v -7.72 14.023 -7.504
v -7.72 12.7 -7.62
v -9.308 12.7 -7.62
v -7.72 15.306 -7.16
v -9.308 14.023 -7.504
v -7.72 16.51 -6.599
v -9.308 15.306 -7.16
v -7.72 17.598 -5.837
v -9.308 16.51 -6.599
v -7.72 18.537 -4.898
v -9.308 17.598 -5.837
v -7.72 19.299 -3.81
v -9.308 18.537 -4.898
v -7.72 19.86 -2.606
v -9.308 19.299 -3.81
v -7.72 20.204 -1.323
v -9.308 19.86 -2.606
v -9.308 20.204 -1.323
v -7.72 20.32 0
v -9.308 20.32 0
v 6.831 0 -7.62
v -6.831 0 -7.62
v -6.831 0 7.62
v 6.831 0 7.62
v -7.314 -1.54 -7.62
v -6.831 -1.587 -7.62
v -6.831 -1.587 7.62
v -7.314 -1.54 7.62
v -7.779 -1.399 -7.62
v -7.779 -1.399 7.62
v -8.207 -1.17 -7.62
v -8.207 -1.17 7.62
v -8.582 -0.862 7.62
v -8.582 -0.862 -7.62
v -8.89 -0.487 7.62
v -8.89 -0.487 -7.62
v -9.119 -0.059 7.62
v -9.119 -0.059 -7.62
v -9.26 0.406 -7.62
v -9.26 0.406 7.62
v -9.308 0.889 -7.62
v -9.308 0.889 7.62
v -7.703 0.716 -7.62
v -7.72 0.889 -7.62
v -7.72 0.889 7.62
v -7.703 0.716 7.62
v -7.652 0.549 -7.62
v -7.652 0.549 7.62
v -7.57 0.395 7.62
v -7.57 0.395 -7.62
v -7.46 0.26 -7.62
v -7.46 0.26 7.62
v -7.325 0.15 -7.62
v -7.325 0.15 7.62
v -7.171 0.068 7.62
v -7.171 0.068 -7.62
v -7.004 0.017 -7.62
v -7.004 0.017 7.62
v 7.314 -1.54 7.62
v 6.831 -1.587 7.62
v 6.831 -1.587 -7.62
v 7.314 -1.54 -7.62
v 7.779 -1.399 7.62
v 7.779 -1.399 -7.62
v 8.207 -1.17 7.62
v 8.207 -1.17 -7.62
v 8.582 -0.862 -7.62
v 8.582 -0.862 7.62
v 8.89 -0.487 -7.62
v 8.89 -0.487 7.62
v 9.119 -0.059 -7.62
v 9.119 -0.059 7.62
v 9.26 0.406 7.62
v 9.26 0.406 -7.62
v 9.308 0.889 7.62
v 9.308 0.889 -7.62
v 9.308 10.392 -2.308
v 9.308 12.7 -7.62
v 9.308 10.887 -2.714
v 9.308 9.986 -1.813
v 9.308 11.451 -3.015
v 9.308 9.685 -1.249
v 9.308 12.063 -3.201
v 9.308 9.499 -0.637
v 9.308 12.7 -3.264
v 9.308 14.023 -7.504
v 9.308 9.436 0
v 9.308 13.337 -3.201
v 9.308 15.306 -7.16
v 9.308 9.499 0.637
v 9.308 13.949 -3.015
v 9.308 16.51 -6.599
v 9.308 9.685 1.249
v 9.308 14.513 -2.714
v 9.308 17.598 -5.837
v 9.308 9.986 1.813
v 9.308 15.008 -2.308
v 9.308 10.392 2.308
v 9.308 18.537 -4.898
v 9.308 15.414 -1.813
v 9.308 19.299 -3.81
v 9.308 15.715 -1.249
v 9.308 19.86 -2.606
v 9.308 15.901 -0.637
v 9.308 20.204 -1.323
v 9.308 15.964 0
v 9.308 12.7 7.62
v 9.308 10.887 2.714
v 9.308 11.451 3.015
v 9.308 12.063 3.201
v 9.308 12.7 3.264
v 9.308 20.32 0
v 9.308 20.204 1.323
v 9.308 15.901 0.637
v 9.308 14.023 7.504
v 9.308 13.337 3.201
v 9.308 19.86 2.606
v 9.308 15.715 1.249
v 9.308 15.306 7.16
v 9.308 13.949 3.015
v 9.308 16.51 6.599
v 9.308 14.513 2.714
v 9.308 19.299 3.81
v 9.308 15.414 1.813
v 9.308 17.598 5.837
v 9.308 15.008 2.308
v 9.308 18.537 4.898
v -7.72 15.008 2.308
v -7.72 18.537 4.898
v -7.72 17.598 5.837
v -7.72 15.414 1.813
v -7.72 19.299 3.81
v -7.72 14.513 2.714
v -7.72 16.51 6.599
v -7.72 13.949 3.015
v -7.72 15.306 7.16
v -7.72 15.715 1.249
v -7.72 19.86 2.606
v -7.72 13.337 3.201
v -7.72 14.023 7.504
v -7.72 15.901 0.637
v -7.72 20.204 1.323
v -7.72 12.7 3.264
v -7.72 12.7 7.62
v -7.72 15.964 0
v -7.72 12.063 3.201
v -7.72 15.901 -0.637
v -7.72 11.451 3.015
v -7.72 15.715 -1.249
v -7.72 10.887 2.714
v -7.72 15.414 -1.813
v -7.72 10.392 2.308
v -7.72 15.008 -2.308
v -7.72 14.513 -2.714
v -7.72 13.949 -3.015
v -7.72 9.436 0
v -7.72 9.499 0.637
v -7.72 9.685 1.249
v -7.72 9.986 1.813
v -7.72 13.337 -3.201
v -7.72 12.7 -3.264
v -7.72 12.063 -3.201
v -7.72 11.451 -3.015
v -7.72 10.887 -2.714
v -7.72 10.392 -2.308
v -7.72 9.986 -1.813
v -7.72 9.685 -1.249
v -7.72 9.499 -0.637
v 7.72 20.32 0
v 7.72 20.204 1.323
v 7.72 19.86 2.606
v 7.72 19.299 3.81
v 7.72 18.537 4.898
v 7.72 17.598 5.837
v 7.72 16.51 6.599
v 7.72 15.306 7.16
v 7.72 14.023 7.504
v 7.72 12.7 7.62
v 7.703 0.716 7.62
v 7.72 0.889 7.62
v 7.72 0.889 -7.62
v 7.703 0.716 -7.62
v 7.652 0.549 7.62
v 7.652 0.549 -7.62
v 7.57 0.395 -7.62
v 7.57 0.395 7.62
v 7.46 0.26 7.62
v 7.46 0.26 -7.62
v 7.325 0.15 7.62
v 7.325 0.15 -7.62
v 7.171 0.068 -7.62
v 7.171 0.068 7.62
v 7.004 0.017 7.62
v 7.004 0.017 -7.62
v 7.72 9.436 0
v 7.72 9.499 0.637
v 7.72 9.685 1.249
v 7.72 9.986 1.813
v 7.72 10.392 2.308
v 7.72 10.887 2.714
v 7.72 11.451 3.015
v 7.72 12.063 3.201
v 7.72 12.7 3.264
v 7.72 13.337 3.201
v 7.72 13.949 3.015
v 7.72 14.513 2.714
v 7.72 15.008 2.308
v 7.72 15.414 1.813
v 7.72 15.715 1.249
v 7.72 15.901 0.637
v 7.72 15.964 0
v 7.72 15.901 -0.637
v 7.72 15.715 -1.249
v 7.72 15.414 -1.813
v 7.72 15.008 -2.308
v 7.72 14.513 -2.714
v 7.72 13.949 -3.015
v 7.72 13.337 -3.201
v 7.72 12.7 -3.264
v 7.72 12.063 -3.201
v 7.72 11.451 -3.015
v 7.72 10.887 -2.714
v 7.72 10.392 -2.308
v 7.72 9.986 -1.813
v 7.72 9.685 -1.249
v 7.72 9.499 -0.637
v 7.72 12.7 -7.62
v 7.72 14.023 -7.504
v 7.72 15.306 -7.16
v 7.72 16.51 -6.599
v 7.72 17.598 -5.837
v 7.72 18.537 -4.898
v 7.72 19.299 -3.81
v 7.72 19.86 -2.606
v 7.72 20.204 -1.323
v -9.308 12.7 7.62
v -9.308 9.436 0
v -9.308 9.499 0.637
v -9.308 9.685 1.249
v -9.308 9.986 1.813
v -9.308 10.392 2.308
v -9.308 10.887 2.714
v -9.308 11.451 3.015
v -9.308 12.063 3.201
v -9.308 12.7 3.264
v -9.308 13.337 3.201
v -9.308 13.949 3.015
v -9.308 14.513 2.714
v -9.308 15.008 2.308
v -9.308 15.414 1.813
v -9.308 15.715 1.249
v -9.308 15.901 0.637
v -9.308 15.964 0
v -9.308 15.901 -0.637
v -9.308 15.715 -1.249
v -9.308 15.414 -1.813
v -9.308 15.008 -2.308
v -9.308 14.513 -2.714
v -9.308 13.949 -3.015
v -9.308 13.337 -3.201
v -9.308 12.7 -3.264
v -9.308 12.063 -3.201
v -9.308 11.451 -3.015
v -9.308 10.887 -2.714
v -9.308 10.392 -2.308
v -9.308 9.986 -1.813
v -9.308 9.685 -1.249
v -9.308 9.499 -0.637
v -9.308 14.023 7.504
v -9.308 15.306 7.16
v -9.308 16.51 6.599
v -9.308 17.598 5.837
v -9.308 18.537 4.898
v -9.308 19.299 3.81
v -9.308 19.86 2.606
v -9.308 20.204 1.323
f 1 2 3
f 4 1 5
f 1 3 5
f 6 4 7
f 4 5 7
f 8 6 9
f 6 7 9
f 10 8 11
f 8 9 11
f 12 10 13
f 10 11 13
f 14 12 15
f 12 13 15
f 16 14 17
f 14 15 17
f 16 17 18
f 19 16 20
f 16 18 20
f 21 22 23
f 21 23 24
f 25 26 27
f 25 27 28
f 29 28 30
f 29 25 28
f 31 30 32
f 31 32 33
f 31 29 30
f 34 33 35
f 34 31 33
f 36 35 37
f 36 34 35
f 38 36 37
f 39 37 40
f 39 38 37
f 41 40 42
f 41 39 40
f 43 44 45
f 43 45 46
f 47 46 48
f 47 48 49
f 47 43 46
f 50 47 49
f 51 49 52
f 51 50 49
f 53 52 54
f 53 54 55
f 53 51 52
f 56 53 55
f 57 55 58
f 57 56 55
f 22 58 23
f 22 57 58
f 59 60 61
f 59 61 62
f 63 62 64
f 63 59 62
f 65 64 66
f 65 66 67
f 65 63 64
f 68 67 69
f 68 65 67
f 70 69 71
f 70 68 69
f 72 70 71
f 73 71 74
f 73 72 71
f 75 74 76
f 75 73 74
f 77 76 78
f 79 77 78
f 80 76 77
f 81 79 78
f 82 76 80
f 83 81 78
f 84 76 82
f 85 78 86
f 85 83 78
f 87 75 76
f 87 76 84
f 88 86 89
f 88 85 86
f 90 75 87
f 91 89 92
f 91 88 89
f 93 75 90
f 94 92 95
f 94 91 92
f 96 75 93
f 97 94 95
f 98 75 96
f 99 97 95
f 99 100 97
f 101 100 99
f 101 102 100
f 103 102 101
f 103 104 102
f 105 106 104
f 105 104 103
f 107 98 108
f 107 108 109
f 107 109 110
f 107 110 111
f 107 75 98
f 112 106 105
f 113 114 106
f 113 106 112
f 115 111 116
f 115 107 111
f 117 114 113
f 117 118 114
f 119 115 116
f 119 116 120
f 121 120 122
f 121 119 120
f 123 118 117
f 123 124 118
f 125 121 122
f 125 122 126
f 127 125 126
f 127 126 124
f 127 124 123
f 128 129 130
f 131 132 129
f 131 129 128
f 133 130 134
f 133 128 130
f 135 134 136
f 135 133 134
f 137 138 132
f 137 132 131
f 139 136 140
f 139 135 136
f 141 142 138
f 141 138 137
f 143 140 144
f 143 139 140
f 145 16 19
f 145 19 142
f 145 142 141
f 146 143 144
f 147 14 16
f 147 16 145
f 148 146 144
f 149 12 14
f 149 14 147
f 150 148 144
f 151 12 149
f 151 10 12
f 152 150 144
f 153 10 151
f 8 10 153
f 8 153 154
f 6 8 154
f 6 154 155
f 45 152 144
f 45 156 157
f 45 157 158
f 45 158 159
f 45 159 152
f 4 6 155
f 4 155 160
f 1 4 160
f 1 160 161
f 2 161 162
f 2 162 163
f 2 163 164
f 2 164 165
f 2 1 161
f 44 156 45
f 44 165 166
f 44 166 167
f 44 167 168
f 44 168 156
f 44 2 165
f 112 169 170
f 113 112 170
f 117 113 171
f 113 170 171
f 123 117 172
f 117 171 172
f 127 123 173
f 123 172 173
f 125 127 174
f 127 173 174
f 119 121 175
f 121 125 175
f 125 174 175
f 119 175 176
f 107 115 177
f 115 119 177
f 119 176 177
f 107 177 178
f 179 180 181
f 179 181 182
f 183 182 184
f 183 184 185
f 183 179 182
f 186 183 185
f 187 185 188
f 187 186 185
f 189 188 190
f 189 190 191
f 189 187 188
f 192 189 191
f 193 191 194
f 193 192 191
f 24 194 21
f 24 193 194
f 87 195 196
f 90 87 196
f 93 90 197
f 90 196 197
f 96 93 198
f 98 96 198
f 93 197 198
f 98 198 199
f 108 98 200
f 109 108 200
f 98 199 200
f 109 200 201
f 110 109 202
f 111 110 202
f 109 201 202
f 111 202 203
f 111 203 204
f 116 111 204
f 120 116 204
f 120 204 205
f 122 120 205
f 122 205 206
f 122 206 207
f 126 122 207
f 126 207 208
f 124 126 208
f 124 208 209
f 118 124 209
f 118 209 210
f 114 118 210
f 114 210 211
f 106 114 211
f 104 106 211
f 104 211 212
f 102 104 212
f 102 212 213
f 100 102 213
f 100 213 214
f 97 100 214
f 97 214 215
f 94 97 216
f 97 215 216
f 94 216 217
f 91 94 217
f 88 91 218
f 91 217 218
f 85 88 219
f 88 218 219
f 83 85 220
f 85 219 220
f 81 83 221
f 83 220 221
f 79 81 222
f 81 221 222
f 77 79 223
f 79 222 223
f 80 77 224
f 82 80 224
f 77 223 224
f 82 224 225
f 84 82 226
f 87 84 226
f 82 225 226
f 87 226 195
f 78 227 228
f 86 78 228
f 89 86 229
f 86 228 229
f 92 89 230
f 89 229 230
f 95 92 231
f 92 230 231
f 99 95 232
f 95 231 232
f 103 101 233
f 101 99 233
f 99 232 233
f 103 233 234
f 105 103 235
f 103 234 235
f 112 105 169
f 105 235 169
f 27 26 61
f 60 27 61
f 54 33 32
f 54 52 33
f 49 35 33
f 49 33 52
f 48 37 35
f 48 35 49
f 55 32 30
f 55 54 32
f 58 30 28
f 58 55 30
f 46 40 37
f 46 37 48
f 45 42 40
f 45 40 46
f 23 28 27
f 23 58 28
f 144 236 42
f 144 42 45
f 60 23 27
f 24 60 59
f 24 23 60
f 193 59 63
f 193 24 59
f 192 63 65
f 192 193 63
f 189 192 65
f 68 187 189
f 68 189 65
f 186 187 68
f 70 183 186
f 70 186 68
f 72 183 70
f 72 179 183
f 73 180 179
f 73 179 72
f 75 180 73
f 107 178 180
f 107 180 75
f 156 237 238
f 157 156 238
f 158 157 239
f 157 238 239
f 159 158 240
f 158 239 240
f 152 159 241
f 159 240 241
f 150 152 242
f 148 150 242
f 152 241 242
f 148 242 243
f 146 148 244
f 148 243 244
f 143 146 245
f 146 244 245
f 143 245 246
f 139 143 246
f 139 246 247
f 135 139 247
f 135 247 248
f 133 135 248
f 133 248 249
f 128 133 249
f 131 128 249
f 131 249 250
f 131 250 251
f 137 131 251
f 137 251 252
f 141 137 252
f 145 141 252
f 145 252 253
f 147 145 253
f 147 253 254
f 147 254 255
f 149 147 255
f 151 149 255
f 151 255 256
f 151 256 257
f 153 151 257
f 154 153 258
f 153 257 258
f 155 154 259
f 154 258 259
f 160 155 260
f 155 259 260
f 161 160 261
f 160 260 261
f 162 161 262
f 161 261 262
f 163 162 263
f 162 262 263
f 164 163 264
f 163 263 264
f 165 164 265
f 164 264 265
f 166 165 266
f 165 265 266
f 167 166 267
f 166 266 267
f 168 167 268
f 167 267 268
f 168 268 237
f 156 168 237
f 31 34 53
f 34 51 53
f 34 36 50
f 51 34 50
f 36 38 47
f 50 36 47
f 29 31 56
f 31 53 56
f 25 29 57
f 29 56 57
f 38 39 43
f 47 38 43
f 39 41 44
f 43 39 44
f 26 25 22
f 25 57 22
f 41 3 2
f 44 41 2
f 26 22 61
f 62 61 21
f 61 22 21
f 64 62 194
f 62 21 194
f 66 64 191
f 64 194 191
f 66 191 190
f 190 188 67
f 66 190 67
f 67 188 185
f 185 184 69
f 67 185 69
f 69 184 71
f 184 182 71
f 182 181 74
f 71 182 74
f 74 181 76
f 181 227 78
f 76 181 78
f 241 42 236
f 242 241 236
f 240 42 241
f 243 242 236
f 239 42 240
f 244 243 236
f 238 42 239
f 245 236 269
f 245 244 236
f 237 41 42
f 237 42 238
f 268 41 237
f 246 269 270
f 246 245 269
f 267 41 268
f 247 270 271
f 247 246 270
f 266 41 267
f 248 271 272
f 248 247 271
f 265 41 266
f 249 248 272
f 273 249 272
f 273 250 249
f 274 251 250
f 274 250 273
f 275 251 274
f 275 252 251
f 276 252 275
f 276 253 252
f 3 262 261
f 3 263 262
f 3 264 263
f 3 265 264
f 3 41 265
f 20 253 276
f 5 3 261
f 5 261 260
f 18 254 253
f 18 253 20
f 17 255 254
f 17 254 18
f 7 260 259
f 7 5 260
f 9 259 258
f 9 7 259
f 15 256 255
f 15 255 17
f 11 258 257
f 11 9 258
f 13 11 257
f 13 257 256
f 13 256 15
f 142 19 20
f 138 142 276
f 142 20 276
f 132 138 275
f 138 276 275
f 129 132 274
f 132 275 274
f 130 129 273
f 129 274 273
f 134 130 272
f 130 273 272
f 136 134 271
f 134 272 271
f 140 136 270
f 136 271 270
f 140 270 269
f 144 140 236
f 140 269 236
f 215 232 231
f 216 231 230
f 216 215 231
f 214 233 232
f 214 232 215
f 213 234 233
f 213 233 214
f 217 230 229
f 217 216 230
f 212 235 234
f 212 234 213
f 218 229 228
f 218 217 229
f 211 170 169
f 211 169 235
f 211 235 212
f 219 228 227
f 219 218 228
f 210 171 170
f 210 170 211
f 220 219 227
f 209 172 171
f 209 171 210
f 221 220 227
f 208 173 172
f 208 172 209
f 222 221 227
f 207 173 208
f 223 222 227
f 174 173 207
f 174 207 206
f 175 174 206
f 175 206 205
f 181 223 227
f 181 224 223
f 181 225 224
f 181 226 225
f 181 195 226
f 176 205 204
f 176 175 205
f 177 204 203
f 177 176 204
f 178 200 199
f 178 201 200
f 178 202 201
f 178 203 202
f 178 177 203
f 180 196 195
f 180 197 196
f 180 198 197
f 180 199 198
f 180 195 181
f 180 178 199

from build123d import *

# Parameters (mm, degrees)
SKETCH1_W                      = 15.24
SKETCH1_H                      = 15.24
BASE_FLANGE1_DEPTH             = 1.5875
EDGE_FLANGE1_STRIP_W           = 8.228
EDGE_FLANGE1_STRIP_H           = 1.5875
EDGE_FLANGE1_STRIP_CUT_DEPTH   = 15.24
EDGE_FLANGE1_STRIP_2_W         = 8.228
EDGE_FLANGE1_STRIP_2_H         = 1.5875
EDGE_FLANGE1_STRIP_CUT_2_DEPTH = 15.24
EDGE_FLANGE1_DEPTH             = 15.24
EDGE_FLANGE1_BEND_DEPTH        = 15.24
CUT_EXTRUDE2_REACH             = 30.592
CUT_EXTRUDE1_REACH             = 30.592
SKETCH13_R                     = 3.2639


# Sheet-metal steps are written as plain solids
with BuildPart() as part:
    # Sketch1 → Base-Flange1 (new body)
    with BuildSketch(Plane(origin=(0, 0, 0), x_dir=(1, 0, 0), z_dir=(0, 1, 0))):
        Rectangle(SKETCH1_W, SKETCH1_H)
    extrude(amount=-BASE_FLANGE1_DEPTH)

    # Edge-Flange1 strip (across the edge) → Edge-Flange1 strip cut (cut)
    with BuildSketch(Plane(origin=(-7.72, 0, -7.62), x_dir=(1, 0, 0), z_dir=(0, 0, 1))):
        with Locations((-3.225, -0.79375)):
            Rectangle(EDGE_FLANGE1_STRIP_W, EDGE_FLANGE1_STRIP_H)
    extrude(amount=EDGE_FLANGE1_STRIP_CUT_DEPTH, mode=Mode.SUBTRACT)

    # Edge-Flange1 strip 2 (across the edge) → Edge-Flange1 strip cut 2 (cut)
    with BuildSketch(Plane(origin=(7.72, 0, 7.62), x_dir=(-1, 0, 0), z_dir=(0, 0, -1))):
        with Locations((-3.225, -0.79375)):
            Rectangle(EDGE_FLANGE1_STRIP_2_W, EDGE_FLANGE1_STRIP_2_H)
    extrude(amount=EDGE_FLANGE1_STRIP_CUT_2_DEPTH, mode=Mode.SUBTRACT)

    # Edge-Flange1 section (across the edge) → Edge-Flange1 (add)
    with BuildSketch(Plane(origin=(-7.72, 0, -7.62), x_dir=(1, 0, 0), z_dir=(0, 0, 1))):
        with BuildLine():
            Line((-1.5875, 0.889), (-1.5875, 20.32))
            Line((-1.5875, 20.32), (0, 20.32))
            Line((0, 20.32), (0, 0.889))
            ThreePointArc((0, 0.889), (0.260382072, 0.260382072), (0.889, 0))
            Line((0.889, 0), (0.889, -1.5875))
            ThreePointArc((0.889, -1.5875), (-0.862149944, -0.862149944), (-1.5875, 0.889))
        make_face()
    extrude(amount=EDGE_FLANGE1_DEPTH)

    # Edge-Flange1 section 2 (across the edge) → Edge-Flange1 bend (add)
    with BuildSketch(Plane(origin=(7.72, 0, 7.62), x_dir=(-1, 0, 0), z_dir=(0, 0, -1))):
        with BuildLine():
            Line((-1.5875, 0.889), (-1.5875, 20.32))
            Line((-1.5875, 20.32), (0, 20.32))
            Line((0, 20.32), (0, 0.889))
            ThreePointArc((0, 0.889), (0.260382072, 0.260382072), (0.889, 0))
            Line((0.889, 0), (0.889, -1.5875))
            ThreePointArc((0.889, -1.5875), (-0.862149944, -0.862149944), (-1.5875, 0.889))
        make_face()
    extrude(amount=EDGE_FLANGE1_BEND_DEPTH)

    # Cut-Extrude2: up to this face of the body (flat: up to its plane)
    cut_extrude2_end = Plane(part.part.faces().sort_by_distance((9.3075, 10.6045, 0))[0])
    # Sketch14 → Cut-Extrude2 (cut, up to the picked face)
    with BuildSketch(Plane.ZY.offset(9.3075), mode=Mode.PRIVATE) as cut_extrude2_sk1:
        with BuildLine():
            Line((-7.62, 20.32), (-7.62, 12.7))
            ThreePointArc((-7.62, 12.7), (-5.388153673, 18.088153673), (0, 20.32))
            Line((0, 20.32), (-7.62, 20.32))
        make_face()
    cut_extrude2_tool1 = split(extrude(cut_extrude2_sk1.sketch, amount=-CUT_EXTRUDE2_REACH, mode=Mode.PRIVATE), bisect_by=cut_extrude2_end, keep=Keep.BOTH, mode=Mode.PRIVATE)
    # Sketch14 → Cut-Extrude2 (cut, up to the picked face)
    with BuildSketch(Plane.ZY.offset(9.3075), mode=Mode.PRIVATE) as cut_extrude2_sk2:
        with BuildLine():
            Line((7.62, 20.32), (0, 20.32))
            ThreePointArc((0, 20.32), (5.388153673, 18.088153673), (7.62, 12.7))
            Line((7.62, 12.7), (7.62, 20.32))
        make_face()
    cut_extrude2_tool2 = split(extrude(cut_extrude2_sk2.sketch, amount=-CUT_EXTRUDE2_REACH, mode=Mode.PRIVATE), bisect_by=cut_extrude2_end, keep=Keep.BOTH, mode=Mode.PRIVATE)
    add(cut_extrude2_tool1.solids().sort_by(Axis((-9.3075, 18.617936, -5.917936), (1, 0, 0)))[0], mode=Mode.SUBTRACT)
    add(cut_extrude2_tool2.solids().sort_by(Axis((-9.3075, 18.617936, 5.917936), (1, 0, 0)))[0], mode=Mode.SUBTRACT)

    # Cut-Extrude1: up to this face of the body (flat: up to its plane)
    cut_extrude1_end = Plane(part.part.faces().sort_by_distance((9.3075, 9.868138134, 0))[0])
    # Sketch13 → Cut-Extrude1 (cut, up to the picked face)
    with BuildSketch(Plane.ZY.offset(9.3075), mode=Mode.PRIVATE) as cut_extrude1_sk1:
        with Locations(Location((0, 12.7, 0), (0, 0, 270))):
            Circle(SKETCH13_R)
    cut_extrude1_tool1 = split(extrude(cut_extrude1_sk1.sketch, amount=-CUT_EXTRUDE1_REACH, mode=Mode.PRIVATE), bisect_by=cut_extrude1_end, keep=Keep.BOTH, mode=Mode.PRIVATE)
    add(cut_extrude1_tool1.solids().sort_by(Axis((-9.3075, 12.7, 0), (1, 0, 0)))[0], mode=Mode.SUBTRACT)


solid = part.part
